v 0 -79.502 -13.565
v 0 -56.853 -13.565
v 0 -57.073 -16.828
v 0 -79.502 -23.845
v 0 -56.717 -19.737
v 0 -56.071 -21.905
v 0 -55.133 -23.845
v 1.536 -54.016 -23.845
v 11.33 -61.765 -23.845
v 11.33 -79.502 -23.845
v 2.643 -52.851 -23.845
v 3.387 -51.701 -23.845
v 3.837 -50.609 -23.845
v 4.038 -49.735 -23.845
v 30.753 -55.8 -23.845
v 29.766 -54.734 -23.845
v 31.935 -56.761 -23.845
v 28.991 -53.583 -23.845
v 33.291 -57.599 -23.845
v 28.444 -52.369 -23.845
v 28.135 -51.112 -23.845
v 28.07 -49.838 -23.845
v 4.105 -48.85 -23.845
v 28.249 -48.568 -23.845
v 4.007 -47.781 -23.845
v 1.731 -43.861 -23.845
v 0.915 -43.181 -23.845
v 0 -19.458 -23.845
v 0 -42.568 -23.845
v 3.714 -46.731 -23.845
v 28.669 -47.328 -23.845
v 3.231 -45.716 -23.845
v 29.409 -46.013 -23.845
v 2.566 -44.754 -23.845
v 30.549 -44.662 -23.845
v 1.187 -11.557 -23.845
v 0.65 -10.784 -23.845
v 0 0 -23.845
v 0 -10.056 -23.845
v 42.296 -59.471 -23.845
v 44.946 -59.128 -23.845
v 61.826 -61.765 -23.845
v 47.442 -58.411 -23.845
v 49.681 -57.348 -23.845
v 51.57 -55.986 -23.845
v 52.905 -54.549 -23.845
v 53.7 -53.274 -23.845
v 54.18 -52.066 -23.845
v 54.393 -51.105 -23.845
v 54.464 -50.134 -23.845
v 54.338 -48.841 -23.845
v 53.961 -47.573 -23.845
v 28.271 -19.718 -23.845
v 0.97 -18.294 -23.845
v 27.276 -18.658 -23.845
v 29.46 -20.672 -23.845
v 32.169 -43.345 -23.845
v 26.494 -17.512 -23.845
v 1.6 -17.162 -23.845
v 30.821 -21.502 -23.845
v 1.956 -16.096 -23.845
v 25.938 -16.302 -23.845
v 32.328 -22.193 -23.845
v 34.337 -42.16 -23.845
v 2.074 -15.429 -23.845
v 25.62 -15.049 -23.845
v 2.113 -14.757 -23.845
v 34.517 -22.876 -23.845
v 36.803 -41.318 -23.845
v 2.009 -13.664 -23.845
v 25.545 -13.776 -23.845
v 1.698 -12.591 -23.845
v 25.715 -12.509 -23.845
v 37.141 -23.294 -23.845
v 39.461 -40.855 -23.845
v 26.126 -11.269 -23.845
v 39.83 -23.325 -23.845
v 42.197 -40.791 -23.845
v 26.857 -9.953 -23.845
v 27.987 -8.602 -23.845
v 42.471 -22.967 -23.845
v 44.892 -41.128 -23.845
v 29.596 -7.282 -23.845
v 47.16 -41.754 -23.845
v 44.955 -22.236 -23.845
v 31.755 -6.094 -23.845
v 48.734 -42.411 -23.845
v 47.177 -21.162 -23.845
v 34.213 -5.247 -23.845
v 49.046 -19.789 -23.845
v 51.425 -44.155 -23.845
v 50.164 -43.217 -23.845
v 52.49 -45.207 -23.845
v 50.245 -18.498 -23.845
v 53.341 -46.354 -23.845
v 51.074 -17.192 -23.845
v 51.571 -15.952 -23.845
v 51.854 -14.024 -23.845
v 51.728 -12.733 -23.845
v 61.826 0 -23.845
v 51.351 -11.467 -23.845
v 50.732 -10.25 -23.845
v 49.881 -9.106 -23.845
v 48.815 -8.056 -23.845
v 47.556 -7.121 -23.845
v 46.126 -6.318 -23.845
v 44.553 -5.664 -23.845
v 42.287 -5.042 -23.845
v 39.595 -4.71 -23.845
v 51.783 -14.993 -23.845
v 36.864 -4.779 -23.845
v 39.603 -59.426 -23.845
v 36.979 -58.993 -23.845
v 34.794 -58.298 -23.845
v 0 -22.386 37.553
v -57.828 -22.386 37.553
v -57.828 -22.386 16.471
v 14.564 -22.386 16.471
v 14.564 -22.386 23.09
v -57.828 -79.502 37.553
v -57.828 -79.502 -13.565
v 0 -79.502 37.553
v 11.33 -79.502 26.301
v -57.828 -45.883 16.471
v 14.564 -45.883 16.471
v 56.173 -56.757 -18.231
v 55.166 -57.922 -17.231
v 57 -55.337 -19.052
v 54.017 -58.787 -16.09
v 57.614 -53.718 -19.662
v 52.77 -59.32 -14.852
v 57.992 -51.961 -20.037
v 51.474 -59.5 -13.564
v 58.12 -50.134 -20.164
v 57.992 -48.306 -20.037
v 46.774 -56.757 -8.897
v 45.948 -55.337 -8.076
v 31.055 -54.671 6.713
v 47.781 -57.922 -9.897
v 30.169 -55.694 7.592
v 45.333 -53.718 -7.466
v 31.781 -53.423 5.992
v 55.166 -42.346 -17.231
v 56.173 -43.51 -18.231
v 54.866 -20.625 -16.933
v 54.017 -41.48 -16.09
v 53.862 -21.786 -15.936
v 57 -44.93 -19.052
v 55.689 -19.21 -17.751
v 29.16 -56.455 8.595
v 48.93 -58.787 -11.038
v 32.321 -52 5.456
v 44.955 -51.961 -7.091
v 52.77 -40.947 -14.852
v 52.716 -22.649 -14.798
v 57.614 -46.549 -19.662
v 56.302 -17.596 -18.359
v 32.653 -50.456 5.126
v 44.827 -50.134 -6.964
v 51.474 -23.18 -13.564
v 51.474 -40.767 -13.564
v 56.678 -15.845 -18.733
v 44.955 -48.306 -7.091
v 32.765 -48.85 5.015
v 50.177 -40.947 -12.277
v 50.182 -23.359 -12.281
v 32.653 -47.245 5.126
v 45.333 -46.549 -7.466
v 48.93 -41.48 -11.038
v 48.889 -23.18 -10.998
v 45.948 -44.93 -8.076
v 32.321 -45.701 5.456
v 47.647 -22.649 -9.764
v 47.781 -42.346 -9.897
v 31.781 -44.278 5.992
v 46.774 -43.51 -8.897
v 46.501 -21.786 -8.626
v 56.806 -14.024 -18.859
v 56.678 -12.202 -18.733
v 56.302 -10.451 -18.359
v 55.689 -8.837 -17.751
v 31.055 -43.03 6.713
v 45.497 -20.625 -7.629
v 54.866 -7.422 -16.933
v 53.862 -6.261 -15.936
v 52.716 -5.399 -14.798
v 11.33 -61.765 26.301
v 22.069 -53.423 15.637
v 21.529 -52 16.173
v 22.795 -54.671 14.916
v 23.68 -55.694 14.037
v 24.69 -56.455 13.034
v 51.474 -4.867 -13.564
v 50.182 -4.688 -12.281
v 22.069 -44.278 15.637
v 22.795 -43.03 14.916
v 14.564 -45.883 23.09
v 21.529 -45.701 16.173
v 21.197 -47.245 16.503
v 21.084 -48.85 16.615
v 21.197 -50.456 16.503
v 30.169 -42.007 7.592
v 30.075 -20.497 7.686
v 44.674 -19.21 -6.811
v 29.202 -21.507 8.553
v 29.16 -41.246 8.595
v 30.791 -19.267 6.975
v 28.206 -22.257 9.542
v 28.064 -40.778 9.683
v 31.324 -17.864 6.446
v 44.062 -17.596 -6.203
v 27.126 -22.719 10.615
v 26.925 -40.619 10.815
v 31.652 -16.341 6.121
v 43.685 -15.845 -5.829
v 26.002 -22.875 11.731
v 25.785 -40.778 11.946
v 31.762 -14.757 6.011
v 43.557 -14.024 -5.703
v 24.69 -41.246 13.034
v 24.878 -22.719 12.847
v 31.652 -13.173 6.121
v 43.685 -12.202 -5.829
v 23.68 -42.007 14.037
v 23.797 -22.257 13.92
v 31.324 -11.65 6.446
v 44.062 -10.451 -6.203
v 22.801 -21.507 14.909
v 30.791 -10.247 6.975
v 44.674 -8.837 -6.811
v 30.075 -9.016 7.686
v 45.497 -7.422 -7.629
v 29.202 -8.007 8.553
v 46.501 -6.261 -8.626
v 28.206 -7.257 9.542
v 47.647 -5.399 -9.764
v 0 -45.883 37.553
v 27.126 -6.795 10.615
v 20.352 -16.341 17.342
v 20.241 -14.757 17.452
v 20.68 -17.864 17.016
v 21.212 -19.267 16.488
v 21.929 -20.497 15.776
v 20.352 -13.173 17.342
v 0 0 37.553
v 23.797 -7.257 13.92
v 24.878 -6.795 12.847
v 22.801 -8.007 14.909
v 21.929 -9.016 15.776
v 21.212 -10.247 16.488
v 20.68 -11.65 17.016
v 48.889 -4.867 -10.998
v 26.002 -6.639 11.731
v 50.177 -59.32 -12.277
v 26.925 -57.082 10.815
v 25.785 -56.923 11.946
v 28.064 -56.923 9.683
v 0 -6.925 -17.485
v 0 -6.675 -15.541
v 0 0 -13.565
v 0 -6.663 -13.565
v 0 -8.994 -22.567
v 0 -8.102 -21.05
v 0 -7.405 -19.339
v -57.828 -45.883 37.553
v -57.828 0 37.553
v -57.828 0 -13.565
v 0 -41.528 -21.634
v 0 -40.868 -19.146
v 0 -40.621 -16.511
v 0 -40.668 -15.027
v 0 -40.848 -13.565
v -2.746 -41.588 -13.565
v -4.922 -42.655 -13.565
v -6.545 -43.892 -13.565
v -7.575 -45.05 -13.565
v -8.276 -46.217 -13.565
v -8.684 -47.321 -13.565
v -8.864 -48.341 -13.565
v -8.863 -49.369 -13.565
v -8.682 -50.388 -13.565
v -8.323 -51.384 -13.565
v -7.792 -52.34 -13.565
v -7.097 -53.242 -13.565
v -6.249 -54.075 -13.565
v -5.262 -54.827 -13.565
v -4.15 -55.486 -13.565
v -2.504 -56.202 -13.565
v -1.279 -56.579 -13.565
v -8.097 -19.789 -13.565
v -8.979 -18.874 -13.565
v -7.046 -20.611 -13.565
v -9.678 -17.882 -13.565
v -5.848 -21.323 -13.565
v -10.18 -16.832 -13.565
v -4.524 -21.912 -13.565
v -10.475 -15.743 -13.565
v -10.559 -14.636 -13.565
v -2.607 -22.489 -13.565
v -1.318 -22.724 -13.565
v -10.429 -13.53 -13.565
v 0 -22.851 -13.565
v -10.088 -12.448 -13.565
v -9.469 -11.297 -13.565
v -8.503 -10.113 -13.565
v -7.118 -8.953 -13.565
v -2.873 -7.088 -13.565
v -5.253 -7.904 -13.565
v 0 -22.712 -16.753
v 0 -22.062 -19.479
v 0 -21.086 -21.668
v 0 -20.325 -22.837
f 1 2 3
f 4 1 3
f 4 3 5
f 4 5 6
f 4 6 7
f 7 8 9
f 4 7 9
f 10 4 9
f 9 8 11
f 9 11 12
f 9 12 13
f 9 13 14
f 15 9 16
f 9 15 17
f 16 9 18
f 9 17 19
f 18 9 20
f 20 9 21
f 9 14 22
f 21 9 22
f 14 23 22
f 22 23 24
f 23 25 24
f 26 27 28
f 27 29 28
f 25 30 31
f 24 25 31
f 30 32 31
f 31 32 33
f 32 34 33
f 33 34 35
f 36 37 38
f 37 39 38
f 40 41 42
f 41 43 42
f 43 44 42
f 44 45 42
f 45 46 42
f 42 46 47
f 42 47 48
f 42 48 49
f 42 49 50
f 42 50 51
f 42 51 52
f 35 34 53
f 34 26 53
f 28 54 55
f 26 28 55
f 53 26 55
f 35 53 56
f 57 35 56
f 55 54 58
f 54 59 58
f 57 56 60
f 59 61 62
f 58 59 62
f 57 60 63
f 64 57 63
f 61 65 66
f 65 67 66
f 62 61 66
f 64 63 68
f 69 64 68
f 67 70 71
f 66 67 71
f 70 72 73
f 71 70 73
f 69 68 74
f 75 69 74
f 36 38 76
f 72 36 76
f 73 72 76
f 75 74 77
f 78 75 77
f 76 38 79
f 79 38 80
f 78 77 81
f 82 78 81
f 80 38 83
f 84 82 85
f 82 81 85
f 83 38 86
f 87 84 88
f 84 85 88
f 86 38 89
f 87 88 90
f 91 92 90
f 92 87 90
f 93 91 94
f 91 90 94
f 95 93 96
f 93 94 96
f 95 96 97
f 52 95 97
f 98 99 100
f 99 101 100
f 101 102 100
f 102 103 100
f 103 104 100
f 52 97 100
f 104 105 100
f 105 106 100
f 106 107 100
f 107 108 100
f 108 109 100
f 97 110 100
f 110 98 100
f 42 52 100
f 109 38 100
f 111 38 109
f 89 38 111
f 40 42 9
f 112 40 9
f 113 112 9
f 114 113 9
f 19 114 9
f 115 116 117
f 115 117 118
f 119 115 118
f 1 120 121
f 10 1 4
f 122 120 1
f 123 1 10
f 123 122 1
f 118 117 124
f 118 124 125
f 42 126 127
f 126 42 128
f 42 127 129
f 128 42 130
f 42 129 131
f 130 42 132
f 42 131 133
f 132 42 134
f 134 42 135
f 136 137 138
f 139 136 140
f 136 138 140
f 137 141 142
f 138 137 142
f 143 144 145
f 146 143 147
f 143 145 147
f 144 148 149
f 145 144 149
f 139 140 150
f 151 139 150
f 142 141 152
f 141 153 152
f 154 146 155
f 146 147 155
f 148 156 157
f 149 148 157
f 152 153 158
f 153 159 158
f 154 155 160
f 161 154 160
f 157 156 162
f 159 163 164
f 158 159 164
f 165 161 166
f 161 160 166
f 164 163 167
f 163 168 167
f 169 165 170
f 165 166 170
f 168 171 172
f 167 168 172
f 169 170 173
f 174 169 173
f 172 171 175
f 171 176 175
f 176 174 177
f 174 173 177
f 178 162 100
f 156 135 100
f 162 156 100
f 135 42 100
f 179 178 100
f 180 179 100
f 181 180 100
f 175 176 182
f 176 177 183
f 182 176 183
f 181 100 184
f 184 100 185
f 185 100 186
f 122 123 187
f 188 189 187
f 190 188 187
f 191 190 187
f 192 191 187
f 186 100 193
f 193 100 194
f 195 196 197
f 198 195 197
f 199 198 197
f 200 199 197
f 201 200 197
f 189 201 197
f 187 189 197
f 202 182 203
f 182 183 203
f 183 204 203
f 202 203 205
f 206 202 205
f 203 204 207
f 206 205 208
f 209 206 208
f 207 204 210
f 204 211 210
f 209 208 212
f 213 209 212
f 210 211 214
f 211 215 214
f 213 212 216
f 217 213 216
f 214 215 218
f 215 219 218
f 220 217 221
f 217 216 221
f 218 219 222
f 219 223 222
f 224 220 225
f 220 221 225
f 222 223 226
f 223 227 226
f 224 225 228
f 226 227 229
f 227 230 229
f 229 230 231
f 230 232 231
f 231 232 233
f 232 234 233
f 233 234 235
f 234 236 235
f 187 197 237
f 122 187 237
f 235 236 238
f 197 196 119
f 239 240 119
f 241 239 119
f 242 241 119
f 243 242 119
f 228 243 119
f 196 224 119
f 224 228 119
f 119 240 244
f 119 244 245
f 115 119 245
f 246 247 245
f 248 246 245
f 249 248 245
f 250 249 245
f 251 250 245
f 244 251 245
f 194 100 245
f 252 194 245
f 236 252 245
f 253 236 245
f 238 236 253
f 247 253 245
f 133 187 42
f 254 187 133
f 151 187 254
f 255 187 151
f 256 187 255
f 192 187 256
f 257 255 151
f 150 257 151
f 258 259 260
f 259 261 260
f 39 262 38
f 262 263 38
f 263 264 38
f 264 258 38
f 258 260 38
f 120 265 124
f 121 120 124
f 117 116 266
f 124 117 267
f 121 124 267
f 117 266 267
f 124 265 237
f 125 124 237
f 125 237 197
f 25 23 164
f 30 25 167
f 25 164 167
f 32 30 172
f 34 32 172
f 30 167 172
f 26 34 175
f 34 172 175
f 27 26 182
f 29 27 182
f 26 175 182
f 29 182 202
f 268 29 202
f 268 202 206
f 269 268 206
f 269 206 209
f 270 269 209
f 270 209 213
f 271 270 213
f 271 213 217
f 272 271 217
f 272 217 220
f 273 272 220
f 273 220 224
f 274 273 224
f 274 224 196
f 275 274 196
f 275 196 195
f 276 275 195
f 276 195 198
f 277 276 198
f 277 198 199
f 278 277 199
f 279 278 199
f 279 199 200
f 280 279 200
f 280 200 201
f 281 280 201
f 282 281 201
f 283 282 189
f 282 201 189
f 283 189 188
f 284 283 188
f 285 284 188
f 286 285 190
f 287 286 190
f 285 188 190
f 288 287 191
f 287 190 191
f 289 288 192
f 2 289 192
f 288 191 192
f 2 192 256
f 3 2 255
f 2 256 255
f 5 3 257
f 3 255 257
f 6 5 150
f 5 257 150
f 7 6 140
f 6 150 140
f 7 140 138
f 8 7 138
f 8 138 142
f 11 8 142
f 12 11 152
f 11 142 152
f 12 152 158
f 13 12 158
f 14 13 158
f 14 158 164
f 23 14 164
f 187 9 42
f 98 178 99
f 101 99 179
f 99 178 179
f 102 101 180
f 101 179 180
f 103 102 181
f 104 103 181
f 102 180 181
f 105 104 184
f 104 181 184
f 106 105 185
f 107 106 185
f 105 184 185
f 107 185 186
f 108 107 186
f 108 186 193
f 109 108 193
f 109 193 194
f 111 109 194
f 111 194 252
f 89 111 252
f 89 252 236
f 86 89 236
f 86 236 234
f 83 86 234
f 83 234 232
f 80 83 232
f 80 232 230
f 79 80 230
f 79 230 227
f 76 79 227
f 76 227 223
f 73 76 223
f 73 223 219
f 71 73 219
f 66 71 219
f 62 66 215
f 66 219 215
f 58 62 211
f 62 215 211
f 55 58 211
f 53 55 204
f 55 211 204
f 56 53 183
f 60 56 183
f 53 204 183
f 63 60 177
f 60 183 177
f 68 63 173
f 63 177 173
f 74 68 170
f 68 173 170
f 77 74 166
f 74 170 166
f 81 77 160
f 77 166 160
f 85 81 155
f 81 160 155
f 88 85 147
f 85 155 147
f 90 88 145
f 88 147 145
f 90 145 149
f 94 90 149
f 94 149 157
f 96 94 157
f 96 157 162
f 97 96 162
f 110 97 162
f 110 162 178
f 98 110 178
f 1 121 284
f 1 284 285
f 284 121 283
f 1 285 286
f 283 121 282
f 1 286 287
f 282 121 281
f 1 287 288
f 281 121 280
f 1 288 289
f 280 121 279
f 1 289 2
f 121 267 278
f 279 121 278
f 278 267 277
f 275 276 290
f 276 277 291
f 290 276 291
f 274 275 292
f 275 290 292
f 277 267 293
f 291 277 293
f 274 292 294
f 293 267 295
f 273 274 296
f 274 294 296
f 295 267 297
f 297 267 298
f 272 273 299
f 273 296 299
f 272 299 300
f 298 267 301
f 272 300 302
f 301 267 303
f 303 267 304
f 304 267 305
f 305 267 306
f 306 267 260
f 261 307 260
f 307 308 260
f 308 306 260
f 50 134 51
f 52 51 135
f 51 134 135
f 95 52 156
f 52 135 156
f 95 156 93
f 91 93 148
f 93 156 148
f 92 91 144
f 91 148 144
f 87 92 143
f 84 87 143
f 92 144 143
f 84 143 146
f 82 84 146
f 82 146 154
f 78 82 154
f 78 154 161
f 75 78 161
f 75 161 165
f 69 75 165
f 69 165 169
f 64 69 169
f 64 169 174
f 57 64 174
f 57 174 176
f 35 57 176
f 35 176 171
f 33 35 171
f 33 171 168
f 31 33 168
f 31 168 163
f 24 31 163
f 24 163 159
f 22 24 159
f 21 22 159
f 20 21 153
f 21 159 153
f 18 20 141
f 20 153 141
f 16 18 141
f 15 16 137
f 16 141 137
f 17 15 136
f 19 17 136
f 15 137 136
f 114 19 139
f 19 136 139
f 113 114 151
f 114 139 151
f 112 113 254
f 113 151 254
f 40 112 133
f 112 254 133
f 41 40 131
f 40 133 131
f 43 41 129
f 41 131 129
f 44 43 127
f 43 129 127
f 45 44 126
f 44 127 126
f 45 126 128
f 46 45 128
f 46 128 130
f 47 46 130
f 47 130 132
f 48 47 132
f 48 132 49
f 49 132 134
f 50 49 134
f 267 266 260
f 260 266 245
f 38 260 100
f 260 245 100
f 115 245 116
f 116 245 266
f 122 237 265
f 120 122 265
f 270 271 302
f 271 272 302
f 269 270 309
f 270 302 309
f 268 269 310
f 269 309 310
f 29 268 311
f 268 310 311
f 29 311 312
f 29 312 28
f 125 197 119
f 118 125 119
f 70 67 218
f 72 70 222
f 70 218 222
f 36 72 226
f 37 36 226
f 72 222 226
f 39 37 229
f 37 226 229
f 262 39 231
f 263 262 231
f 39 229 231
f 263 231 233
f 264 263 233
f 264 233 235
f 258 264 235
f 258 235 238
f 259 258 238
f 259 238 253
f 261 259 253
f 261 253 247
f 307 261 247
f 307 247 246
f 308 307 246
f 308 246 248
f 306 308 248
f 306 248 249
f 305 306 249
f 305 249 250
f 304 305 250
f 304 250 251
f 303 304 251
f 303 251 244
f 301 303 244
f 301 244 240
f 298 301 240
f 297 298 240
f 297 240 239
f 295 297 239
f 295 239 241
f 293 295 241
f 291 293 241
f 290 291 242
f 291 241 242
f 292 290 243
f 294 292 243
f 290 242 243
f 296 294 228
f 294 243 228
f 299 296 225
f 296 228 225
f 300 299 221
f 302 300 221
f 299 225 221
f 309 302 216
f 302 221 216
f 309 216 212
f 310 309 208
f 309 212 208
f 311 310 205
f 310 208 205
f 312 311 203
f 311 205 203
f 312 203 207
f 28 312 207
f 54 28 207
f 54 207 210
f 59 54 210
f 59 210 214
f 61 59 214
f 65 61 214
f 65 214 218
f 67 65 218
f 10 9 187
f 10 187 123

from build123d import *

# Parameters (mm, degrees)
F1_DEPTH  = 79.502
F2_W      = 30.8898873627
F2_H      = 37.5404208899
F3_DEPTH  = 25.4
F4_W      = 57.8284673393
F4_H      = 24.1576582193
F5_DEPTH  = 12.446
F6_W      = 72.3921172321
F6_H      = 23.4968811274
F7_DEPTH  = 21.082
F8_W      = 50.496625714
F8_H      = 17.7371860404
F9_DEPTH  = 56.388
F10_R     = 8.2310342768
F10_R_2   = 9.3664724304
F10_R_3   = 8.1183056078
F10_R_4   = 9.3356883849
F11_DEPTH = 85.344


with BuildPart() as f1:
    # F0 (on Front) → F1 (new body)
    with BuildSketch(Plane.XZ):
        Polygon((0, 37.5528037548), (-57.8284673393, 37.5528037548), (-57.8284673393, -13.5647049174), (0, -13.5647049174), (0, -23.8453224301), (61.8264861405, -23.8453224301), align=None)
    extrude(amount=F1_DEPTH)

    # F2 (on face) → F3 (cut)
    with BuildSketch(Plane.XY.offset(37.5528037548)):
        with Locations((-73.2734110206, -35.337369889)):
            Rectangle(F2_W, F2_H)
    extrude(amount=-F3_DEPTH, mode=Mode.SUBTRACT)

    # F4 (on face) → F5 (join)
    with BuildSketch(Plane.XY.offset(37.5528037548)):
        with Locations((-28.9142336696, -37.3493023217)):
            Rectangle(F4_W, F4_H)
    extrude(amount=-F5_DEPTH)

    # F6 (on face) → F7 (cut)
    with BuildSketch(Plane.XY.offset(37.5528037548)):
        with Locations((-21.6324087232, -34.1343507171)):
            Rectangle(F6_W, F6_H)
    extrude(amount=-F7_DEPTH, mode=Mode.SUBTRACT)

    # F8 (on face) → F9 (cut)
    with BuildSketch(Plane(origin=(0, 0, -23.8453224301), x_dir=(1, 0, 0), z_dir=(0, 0, -1))):
        with Locations((36.5781732835, 70.6334069798)):
            Rectangle(F8_W, F8_H)
    extrude(amount=-F9_DEPTH, mode=Mode.SUBTRACT)

    # F10 (on face) → F11 (cut)
    with BuildSketch(Plane(origin=(18.7759480822, 0, 18.9069433549), x_dir=(0.7095605761, 0, -0.7046444414), z_dir=(0.7046444414, 0, 0.7095605761))):
        with Locations((11.4842364565, -48.8504841924)):
            Circle(F10_R)
        with Locations((46.0814908147, -50.1335784793)):
            Circle(F10_R_2)
        with Locations((10.1835876703, -14.756876044)):
            Circle(F10_R_3)
        with Locations((44.260583818, -14.0236811712)):
            Circle(F10_R_4)
    extrude(amount=-F11_DEPTH, mode=Mode.SUBTRACT)


solid = f1.part
